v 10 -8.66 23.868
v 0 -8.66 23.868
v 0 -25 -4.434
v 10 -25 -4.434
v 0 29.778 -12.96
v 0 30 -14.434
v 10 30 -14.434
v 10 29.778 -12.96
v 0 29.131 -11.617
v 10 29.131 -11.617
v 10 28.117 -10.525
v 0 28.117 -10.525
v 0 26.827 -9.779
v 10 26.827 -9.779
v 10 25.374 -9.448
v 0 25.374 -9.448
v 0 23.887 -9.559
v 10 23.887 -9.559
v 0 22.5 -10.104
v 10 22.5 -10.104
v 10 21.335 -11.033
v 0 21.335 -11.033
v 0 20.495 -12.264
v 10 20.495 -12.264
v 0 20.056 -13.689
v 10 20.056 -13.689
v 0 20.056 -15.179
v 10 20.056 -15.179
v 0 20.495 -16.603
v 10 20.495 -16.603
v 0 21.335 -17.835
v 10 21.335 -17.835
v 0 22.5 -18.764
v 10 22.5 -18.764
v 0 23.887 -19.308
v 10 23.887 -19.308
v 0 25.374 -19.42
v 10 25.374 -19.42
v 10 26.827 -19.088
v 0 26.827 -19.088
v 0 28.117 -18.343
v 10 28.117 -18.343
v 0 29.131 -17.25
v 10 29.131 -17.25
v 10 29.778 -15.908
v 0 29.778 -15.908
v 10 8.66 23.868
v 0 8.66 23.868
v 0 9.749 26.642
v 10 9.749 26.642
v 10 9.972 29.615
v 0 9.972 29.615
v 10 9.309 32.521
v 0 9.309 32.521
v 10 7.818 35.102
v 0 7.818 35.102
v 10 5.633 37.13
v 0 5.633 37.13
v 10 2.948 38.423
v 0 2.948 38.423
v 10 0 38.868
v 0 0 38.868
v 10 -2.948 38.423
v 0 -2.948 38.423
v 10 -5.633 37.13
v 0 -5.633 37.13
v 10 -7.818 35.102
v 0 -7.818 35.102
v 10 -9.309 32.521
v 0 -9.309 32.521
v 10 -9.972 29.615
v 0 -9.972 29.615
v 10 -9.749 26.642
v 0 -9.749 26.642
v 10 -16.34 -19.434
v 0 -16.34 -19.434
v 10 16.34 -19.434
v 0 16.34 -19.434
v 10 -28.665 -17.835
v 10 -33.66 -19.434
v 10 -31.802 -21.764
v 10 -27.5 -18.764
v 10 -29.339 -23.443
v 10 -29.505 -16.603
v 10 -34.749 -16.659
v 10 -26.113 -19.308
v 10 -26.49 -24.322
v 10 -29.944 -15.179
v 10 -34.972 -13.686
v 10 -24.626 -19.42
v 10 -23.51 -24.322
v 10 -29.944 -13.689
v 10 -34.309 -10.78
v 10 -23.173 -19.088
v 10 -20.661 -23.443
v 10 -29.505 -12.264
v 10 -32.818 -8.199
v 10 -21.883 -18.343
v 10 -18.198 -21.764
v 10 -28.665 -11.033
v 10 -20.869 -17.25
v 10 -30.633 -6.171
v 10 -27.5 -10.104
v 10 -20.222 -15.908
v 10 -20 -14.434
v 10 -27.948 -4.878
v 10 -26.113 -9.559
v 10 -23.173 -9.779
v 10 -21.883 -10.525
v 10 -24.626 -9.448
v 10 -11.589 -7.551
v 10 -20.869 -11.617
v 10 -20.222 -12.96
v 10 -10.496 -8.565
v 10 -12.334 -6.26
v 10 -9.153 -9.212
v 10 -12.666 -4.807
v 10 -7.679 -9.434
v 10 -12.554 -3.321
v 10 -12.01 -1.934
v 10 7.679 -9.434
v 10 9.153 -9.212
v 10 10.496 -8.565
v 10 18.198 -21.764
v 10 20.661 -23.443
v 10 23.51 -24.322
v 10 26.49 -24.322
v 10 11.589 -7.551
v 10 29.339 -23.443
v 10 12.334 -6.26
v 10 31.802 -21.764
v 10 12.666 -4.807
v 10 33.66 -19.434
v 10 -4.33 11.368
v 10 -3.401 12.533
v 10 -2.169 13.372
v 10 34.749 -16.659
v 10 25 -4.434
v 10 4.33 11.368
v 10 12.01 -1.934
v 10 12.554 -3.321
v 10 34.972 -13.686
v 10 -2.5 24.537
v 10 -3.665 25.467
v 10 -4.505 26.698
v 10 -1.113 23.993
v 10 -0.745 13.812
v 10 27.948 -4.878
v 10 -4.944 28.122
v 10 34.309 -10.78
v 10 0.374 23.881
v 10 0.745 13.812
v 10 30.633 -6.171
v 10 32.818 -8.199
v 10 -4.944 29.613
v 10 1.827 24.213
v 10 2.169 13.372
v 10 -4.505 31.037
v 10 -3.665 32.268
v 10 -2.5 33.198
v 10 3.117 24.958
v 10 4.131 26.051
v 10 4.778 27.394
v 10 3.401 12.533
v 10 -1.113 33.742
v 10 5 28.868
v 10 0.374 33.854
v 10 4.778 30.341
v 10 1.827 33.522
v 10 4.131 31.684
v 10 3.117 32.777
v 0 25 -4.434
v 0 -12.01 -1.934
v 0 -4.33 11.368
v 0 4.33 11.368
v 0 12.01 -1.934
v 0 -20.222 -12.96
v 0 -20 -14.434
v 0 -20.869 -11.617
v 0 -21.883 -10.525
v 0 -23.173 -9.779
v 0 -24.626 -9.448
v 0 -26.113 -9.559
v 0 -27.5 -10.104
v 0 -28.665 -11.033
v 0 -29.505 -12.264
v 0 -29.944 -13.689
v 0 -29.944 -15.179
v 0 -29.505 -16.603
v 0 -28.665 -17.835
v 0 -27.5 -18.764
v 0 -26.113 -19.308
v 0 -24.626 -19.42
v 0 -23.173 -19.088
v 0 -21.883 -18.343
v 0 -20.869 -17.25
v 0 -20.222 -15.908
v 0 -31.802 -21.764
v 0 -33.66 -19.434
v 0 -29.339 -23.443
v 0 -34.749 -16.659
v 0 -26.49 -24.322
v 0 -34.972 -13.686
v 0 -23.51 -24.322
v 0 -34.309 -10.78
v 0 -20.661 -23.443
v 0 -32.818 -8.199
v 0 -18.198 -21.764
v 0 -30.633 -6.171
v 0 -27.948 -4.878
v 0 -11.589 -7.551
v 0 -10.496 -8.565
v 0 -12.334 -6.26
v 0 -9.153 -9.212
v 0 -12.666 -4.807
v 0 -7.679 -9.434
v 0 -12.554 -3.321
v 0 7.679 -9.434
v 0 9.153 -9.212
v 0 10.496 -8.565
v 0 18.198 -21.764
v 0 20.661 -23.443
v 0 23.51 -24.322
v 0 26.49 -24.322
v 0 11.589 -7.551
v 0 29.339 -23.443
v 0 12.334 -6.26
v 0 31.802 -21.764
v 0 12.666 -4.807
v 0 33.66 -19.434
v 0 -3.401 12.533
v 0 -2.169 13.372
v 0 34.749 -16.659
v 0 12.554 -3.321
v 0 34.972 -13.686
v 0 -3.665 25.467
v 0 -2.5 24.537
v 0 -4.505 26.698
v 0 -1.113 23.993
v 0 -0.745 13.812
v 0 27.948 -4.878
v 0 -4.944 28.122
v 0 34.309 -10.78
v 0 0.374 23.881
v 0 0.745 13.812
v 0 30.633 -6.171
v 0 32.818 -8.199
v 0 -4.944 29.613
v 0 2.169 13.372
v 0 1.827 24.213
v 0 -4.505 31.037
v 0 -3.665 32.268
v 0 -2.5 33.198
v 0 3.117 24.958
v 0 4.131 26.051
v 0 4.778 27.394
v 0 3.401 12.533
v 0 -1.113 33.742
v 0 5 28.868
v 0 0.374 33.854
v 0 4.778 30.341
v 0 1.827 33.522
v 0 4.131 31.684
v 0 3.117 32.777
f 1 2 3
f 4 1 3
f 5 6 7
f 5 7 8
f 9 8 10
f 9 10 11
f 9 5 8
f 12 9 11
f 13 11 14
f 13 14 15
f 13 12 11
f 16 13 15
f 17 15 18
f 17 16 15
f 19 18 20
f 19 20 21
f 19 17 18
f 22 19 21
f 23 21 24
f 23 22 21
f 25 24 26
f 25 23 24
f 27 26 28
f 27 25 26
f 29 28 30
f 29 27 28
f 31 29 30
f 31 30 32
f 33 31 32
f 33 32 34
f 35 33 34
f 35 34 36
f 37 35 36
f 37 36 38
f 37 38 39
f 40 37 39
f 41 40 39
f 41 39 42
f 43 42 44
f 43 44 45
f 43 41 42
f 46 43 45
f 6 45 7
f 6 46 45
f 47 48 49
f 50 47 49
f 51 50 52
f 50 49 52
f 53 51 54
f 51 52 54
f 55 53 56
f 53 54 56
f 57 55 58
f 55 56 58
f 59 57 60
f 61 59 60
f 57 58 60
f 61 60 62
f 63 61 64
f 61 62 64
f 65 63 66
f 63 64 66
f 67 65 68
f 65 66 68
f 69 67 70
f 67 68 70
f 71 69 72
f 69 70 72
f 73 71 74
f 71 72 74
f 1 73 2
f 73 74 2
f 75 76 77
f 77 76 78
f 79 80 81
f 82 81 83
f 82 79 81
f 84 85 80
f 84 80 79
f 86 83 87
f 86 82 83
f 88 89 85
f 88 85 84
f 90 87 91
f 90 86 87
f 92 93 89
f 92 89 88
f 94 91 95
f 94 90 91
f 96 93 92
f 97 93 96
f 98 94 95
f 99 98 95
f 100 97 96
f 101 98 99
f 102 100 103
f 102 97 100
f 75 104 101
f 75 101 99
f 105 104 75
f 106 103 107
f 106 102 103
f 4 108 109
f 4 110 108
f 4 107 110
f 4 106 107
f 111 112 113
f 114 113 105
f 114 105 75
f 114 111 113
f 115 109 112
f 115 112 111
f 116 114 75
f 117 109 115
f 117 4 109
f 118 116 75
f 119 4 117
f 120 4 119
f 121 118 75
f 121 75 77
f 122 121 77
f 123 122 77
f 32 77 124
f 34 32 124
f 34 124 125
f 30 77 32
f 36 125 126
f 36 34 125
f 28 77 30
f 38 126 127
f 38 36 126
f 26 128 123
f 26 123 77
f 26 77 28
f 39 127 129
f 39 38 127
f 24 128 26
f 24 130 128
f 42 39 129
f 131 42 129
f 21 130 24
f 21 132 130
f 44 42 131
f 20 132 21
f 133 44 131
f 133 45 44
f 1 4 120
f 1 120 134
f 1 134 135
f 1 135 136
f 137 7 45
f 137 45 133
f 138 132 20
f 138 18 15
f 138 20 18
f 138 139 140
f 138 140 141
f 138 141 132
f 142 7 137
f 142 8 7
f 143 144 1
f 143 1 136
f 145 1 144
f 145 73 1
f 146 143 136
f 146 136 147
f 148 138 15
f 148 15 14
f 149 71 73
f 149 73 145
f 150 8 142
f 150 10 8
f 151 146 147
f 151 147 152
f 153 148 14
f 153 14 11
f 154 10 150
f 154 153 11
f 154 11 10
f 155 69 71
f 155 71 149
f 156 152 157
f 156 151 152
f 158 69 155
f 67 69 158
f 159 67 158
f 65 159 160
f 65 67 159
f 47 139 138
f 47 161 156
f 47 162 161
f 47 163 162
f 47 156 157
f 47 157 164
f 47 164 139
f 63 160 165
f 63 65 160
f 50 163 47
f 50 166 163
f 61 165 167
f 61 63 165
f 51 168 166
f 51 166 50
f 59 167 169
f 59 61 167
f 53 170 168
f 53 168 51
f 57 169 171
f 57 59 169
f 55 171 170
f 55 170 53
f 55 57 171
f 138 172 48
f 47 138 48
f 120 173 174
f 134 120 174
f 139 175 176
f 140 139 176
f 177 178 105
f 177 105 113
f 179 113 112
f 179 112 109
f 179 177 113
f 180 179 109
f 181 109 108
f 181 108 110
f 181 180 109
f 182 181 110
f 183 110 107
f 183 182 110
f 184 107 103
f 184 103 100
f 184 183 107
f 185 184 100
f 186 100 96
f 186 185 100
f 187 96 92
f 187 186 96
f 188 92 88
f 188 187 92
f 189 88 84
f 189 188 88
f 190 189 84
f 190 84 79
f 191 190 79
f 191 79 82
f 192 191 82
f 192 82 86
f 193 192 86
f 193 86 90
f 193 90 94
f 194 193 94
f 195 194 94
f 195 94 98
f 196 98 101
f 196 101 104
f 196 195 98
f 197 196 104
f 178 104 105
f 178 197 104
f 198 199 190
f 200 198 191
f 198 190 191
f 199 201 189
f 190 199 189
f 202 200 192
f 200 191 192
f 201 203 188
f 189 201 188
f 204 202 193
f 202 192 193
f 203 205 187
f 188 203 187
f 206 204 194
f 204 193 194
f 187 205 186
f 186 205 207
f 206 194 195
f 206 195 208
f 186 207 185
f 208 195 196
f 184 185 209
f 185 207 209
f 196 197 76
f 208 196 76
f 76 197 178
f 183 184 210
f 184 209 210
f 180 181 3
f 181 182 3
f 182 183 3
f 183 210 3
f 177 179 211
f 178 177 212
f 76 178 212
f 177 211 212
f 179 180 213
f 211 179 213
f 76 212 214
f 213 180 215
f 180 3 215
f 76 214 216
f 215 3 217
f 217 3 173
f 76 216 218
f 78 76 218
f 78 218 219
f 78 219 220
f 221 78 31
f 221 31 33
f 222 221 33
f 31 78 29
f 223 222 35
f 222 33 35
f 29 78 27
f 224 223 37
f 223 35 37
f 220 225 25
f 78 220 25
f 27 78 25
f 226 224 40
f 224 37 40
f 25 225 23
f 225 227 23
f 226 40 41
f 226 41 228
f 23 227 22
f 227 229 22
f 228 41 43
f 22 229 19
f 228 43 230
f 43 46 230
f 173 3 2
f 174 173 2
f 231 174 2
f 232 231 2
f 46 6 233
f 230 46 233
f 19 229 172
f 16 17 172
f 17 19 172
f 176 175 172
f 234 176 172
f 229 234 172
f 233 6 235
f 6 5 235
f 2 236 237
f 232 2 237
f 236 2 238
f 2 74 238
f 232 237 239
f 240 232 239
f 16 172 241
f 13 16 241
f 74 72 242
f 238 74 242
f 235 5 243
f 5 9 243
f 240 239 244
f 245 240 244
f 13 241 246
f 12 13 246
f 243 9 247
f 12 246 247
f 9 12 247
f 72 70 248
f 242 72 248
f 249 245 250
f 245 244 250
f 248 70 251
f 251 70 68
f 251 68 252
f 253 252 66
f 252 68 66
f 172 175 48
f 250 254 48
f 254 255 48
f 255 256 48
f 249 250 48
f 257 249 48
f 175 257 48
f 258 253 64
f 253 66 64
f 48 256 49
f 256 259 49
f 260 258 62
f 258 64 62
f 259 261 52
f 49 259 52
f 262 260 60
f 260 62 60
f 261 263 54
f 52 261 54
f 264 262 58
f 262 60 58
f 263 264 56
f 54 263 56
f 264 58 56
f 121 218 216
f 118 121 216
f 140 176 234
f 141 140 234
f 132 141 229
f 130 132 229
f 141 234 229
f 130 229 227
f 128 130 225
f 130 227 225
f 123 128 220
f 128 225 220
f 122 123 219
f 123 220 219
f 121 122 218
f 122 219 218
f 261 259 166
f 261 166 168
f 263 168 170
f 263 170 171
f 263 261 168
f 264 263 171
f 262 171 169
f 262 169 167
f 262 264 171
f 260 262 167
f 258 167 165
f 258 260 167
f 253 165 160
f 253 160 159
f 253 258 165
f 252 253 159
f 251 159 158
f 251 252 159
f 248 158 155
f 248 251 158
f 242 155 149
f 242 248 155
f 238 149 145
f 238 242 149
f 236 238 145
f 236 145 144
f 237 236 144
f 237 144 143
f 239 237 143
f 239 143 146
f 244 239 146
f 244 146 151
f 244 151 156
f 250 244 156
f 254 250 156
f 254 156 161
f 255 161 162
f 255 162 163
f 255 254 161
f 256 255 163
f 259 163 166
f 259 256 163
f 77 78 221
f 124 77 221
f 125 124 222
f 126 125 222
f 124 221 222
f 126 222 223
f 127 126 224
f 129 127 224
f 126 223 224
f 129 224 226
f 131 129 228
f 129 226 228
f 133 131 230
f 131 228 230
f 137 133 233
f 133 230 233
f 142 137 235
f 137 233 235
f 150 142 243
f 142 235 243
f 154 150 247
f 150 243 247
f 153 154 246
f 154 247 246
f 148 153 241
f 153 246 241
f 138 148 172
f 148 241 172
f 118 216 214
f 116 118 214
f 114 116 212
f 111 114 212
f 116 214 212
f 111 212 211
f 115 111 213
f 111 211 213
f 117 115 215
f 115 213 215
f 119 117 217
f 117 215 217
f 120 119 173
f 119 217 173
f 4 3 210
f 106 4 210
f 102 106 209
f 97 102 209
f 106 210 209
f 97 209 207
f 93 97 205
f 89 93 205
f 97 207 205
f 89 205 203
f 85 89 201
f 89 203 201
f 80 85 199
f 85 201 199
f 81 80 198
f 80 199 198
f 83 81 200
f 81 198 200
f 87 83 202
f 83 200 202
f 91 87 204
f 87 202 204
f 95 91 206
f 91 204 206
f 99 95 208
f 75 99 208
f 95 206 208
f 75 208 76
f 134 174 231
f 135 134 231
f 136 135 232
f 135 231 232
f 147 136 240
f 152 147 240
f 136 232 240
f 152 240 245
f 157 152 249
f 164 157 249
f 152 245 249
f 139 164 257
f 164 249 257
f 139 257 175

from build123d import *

# Parameters (mm, degrees)
F0_R     = 5
F1_DEPTH = 10


with BuildPart() as f1:
    # F0 (on Right) → F1 (new body)
    with BuildSketch(Plane.YZ):
        with BuildLine():
            Line((25.000001, -4.433757), (8.660254, 23.867514))
            ThreePointArc((8.660254, 23.867514), (0, 38.867513), (-8.660254, 23.867513))
            Line((-8.660254, 23.867513), (-25, -4.433757))
            ThreePointArc((-25, -4.433757), (-33.660254, -19.433756), (-16.339746, -19.433757))
            Line((-16.339746, -19.433757), (16.339746, -19.433757))
            ThreePointArc((16.339746, -19.433757), (33.660254, -19.433757), (25.000001, -4.433757))
        make_face()
        with Locations((-25, -14.433757)):
            Circle(F0_R, mode=Mode.SUBTRACT)
        with Locations((25, -14.433757)):
            Circle(F0_R, mode=Mode.SUBTRACT)
        with BuildLine():
            ThreePointArc((-4.330127, 11.367513), (0, 13.867513), (4.330127, 11.367513))
            Line((4.330127, 11.367513), (12.009619, -1.933757))
            ThreePointArc((12.009619, -1.933757), (12.009619, -6.933757), (7.679492, -9.433757))
            Line((7.679492, -9.433757), (-7.679492, -9.433757))
            ThreePointArc((-7.679492, -9.433757), (-12.009619, -6.933757), (-12.009619, -1.933757))
            Line((-12.009619, -1.933757), (-4.330127, 11.367513))
        make_face(mode=Mode.SUBTRACT)
        with Locations((0, 28.867513)):
            Circle(F0_R, mode=Mode.SUBTRACT)
    extrude(amount=F1_DEPTH)


solid = f1.part
